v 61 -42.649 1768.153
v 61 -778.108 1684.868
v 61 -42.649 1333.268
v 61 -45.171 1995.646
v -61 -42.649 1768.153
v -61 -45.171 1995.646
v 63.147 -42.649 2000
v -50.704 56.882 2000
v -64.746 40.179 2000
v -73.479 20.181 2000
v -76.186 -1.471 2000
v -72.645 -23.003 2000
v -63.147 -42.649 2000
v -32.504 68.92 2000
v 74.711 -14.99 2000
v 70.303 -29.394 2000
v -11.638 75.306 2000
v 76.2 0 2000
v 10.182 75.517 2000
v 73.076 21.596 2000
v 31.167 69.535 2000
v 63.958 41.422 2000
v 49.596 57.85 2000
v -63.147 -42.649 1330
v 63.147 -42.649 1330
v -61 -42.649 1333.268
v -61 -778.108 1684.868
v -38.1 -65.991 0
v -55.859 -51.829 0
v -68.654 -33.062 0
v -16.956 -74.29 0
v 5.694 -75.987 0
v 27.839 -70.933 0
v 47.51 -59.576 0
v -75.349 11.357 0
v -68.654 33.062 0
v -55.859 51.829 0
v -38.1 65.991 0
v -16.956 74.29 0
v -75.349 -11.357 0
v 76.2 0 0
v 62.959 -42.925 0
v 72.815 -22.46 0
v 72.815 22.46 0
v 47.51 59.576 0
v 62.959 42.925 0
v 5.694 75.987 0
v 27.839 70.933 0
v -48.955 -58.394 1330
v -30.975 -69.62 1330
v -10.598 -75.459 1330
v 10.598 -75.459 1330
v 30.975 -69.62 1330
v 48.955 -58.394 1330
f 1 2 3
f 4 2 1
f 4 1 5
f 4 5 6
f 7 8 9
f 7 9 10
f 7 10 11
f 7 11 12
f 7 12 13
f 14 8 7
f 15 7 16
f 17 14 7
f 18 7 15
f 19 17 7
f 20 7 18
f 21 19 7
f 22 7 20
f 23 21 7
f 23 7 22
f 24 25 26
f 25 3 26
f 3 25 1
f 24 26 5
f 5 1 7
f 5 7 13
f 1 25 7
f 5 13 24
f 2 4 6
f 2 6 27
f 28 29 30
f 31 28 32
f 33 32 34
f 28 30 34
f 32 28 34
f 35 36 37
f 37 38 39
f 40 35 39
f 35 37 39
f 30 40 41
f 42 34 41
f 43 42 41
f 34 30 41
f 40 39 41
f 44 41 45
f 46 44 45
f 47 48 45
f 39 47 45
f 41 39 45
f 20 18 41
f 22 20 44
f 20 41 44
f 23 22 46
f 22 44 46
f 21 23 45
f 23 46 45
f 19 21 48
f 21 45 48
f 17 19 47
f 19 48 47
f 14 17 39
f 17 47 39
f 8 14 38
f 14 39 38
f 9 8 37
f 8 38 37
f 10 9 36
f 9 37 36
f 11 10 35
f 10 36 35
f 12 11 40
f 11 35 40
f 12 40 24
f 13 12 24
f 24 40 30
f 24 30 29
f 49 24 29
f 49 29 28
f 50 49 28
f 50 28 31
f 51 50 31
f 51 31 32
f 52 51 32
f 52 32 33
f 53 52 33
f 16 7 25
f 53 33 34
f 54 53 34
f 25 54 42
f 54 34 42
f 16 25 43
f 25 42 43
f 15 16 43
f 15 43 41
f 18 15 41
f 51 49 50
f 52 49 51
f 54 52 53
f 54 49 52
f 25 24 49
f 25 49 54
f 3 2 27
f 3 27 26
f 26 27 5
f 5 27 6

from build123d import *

# Parameters (mm, degrees)
F0_R     = 76.2
F1_DEPTH = 2000
F3_DEPTH = 670
F5_DEPTH = 61


with BuildPart() as f1:
    # F0 (on Top) → F1 (new body)
    with BuildSketch(Plane.XY):
        Circle(F0_R)
    extrude(amount=F1_DEPTH)

    # F2 (on face) → F3 (cut)
    with BuildSketch(Plane.XY.offset(2000)):
        with BuildLine():
            Line((-63.1467790732, -42.6488486677), (-76.2, -42.6488486677))
            Line((-76.2, -42.6488486677), (-76.2, -102.6488486677))
            Line((-76.2, -102.6488486677), (76.2, -102.6488486677))
            Line((76.2, -102.6488486677), (76.2, -42.6488486677))
            Line((76.2, -42.6488486677), (63.1467790732, -42.6488486677))
            ThreePointArc((63.1467790732, -42.6488486677), (0, -76.2), (-63.1467790732, -42.6488486677))
        make_face()
        with BuildLine():
            Line((63.1467790732, -42.6488486677), (-63.1467790732, -42.6488486677))
            ThreePointArc((-63.1467790732, -42.6488486677), (0, -76.2), (63.1467790732, -42.6488486677))
        make_face()
    extrude(amount=-F3_DEPTH, mode=Mode.SUBTRACT)

    # F4 (on Right) → F5 (join, symmetric)
    with BuildSketch(Plane.YZ):
        Polygon((-37.8018170595, 1330.9504985809), (-45.1709479094, 1995.6457614899), (-778.1082391739, 1684.8677396774), align=None)
    extrude(amount=F5_DEPTH, both=True)


solid = f1.part
